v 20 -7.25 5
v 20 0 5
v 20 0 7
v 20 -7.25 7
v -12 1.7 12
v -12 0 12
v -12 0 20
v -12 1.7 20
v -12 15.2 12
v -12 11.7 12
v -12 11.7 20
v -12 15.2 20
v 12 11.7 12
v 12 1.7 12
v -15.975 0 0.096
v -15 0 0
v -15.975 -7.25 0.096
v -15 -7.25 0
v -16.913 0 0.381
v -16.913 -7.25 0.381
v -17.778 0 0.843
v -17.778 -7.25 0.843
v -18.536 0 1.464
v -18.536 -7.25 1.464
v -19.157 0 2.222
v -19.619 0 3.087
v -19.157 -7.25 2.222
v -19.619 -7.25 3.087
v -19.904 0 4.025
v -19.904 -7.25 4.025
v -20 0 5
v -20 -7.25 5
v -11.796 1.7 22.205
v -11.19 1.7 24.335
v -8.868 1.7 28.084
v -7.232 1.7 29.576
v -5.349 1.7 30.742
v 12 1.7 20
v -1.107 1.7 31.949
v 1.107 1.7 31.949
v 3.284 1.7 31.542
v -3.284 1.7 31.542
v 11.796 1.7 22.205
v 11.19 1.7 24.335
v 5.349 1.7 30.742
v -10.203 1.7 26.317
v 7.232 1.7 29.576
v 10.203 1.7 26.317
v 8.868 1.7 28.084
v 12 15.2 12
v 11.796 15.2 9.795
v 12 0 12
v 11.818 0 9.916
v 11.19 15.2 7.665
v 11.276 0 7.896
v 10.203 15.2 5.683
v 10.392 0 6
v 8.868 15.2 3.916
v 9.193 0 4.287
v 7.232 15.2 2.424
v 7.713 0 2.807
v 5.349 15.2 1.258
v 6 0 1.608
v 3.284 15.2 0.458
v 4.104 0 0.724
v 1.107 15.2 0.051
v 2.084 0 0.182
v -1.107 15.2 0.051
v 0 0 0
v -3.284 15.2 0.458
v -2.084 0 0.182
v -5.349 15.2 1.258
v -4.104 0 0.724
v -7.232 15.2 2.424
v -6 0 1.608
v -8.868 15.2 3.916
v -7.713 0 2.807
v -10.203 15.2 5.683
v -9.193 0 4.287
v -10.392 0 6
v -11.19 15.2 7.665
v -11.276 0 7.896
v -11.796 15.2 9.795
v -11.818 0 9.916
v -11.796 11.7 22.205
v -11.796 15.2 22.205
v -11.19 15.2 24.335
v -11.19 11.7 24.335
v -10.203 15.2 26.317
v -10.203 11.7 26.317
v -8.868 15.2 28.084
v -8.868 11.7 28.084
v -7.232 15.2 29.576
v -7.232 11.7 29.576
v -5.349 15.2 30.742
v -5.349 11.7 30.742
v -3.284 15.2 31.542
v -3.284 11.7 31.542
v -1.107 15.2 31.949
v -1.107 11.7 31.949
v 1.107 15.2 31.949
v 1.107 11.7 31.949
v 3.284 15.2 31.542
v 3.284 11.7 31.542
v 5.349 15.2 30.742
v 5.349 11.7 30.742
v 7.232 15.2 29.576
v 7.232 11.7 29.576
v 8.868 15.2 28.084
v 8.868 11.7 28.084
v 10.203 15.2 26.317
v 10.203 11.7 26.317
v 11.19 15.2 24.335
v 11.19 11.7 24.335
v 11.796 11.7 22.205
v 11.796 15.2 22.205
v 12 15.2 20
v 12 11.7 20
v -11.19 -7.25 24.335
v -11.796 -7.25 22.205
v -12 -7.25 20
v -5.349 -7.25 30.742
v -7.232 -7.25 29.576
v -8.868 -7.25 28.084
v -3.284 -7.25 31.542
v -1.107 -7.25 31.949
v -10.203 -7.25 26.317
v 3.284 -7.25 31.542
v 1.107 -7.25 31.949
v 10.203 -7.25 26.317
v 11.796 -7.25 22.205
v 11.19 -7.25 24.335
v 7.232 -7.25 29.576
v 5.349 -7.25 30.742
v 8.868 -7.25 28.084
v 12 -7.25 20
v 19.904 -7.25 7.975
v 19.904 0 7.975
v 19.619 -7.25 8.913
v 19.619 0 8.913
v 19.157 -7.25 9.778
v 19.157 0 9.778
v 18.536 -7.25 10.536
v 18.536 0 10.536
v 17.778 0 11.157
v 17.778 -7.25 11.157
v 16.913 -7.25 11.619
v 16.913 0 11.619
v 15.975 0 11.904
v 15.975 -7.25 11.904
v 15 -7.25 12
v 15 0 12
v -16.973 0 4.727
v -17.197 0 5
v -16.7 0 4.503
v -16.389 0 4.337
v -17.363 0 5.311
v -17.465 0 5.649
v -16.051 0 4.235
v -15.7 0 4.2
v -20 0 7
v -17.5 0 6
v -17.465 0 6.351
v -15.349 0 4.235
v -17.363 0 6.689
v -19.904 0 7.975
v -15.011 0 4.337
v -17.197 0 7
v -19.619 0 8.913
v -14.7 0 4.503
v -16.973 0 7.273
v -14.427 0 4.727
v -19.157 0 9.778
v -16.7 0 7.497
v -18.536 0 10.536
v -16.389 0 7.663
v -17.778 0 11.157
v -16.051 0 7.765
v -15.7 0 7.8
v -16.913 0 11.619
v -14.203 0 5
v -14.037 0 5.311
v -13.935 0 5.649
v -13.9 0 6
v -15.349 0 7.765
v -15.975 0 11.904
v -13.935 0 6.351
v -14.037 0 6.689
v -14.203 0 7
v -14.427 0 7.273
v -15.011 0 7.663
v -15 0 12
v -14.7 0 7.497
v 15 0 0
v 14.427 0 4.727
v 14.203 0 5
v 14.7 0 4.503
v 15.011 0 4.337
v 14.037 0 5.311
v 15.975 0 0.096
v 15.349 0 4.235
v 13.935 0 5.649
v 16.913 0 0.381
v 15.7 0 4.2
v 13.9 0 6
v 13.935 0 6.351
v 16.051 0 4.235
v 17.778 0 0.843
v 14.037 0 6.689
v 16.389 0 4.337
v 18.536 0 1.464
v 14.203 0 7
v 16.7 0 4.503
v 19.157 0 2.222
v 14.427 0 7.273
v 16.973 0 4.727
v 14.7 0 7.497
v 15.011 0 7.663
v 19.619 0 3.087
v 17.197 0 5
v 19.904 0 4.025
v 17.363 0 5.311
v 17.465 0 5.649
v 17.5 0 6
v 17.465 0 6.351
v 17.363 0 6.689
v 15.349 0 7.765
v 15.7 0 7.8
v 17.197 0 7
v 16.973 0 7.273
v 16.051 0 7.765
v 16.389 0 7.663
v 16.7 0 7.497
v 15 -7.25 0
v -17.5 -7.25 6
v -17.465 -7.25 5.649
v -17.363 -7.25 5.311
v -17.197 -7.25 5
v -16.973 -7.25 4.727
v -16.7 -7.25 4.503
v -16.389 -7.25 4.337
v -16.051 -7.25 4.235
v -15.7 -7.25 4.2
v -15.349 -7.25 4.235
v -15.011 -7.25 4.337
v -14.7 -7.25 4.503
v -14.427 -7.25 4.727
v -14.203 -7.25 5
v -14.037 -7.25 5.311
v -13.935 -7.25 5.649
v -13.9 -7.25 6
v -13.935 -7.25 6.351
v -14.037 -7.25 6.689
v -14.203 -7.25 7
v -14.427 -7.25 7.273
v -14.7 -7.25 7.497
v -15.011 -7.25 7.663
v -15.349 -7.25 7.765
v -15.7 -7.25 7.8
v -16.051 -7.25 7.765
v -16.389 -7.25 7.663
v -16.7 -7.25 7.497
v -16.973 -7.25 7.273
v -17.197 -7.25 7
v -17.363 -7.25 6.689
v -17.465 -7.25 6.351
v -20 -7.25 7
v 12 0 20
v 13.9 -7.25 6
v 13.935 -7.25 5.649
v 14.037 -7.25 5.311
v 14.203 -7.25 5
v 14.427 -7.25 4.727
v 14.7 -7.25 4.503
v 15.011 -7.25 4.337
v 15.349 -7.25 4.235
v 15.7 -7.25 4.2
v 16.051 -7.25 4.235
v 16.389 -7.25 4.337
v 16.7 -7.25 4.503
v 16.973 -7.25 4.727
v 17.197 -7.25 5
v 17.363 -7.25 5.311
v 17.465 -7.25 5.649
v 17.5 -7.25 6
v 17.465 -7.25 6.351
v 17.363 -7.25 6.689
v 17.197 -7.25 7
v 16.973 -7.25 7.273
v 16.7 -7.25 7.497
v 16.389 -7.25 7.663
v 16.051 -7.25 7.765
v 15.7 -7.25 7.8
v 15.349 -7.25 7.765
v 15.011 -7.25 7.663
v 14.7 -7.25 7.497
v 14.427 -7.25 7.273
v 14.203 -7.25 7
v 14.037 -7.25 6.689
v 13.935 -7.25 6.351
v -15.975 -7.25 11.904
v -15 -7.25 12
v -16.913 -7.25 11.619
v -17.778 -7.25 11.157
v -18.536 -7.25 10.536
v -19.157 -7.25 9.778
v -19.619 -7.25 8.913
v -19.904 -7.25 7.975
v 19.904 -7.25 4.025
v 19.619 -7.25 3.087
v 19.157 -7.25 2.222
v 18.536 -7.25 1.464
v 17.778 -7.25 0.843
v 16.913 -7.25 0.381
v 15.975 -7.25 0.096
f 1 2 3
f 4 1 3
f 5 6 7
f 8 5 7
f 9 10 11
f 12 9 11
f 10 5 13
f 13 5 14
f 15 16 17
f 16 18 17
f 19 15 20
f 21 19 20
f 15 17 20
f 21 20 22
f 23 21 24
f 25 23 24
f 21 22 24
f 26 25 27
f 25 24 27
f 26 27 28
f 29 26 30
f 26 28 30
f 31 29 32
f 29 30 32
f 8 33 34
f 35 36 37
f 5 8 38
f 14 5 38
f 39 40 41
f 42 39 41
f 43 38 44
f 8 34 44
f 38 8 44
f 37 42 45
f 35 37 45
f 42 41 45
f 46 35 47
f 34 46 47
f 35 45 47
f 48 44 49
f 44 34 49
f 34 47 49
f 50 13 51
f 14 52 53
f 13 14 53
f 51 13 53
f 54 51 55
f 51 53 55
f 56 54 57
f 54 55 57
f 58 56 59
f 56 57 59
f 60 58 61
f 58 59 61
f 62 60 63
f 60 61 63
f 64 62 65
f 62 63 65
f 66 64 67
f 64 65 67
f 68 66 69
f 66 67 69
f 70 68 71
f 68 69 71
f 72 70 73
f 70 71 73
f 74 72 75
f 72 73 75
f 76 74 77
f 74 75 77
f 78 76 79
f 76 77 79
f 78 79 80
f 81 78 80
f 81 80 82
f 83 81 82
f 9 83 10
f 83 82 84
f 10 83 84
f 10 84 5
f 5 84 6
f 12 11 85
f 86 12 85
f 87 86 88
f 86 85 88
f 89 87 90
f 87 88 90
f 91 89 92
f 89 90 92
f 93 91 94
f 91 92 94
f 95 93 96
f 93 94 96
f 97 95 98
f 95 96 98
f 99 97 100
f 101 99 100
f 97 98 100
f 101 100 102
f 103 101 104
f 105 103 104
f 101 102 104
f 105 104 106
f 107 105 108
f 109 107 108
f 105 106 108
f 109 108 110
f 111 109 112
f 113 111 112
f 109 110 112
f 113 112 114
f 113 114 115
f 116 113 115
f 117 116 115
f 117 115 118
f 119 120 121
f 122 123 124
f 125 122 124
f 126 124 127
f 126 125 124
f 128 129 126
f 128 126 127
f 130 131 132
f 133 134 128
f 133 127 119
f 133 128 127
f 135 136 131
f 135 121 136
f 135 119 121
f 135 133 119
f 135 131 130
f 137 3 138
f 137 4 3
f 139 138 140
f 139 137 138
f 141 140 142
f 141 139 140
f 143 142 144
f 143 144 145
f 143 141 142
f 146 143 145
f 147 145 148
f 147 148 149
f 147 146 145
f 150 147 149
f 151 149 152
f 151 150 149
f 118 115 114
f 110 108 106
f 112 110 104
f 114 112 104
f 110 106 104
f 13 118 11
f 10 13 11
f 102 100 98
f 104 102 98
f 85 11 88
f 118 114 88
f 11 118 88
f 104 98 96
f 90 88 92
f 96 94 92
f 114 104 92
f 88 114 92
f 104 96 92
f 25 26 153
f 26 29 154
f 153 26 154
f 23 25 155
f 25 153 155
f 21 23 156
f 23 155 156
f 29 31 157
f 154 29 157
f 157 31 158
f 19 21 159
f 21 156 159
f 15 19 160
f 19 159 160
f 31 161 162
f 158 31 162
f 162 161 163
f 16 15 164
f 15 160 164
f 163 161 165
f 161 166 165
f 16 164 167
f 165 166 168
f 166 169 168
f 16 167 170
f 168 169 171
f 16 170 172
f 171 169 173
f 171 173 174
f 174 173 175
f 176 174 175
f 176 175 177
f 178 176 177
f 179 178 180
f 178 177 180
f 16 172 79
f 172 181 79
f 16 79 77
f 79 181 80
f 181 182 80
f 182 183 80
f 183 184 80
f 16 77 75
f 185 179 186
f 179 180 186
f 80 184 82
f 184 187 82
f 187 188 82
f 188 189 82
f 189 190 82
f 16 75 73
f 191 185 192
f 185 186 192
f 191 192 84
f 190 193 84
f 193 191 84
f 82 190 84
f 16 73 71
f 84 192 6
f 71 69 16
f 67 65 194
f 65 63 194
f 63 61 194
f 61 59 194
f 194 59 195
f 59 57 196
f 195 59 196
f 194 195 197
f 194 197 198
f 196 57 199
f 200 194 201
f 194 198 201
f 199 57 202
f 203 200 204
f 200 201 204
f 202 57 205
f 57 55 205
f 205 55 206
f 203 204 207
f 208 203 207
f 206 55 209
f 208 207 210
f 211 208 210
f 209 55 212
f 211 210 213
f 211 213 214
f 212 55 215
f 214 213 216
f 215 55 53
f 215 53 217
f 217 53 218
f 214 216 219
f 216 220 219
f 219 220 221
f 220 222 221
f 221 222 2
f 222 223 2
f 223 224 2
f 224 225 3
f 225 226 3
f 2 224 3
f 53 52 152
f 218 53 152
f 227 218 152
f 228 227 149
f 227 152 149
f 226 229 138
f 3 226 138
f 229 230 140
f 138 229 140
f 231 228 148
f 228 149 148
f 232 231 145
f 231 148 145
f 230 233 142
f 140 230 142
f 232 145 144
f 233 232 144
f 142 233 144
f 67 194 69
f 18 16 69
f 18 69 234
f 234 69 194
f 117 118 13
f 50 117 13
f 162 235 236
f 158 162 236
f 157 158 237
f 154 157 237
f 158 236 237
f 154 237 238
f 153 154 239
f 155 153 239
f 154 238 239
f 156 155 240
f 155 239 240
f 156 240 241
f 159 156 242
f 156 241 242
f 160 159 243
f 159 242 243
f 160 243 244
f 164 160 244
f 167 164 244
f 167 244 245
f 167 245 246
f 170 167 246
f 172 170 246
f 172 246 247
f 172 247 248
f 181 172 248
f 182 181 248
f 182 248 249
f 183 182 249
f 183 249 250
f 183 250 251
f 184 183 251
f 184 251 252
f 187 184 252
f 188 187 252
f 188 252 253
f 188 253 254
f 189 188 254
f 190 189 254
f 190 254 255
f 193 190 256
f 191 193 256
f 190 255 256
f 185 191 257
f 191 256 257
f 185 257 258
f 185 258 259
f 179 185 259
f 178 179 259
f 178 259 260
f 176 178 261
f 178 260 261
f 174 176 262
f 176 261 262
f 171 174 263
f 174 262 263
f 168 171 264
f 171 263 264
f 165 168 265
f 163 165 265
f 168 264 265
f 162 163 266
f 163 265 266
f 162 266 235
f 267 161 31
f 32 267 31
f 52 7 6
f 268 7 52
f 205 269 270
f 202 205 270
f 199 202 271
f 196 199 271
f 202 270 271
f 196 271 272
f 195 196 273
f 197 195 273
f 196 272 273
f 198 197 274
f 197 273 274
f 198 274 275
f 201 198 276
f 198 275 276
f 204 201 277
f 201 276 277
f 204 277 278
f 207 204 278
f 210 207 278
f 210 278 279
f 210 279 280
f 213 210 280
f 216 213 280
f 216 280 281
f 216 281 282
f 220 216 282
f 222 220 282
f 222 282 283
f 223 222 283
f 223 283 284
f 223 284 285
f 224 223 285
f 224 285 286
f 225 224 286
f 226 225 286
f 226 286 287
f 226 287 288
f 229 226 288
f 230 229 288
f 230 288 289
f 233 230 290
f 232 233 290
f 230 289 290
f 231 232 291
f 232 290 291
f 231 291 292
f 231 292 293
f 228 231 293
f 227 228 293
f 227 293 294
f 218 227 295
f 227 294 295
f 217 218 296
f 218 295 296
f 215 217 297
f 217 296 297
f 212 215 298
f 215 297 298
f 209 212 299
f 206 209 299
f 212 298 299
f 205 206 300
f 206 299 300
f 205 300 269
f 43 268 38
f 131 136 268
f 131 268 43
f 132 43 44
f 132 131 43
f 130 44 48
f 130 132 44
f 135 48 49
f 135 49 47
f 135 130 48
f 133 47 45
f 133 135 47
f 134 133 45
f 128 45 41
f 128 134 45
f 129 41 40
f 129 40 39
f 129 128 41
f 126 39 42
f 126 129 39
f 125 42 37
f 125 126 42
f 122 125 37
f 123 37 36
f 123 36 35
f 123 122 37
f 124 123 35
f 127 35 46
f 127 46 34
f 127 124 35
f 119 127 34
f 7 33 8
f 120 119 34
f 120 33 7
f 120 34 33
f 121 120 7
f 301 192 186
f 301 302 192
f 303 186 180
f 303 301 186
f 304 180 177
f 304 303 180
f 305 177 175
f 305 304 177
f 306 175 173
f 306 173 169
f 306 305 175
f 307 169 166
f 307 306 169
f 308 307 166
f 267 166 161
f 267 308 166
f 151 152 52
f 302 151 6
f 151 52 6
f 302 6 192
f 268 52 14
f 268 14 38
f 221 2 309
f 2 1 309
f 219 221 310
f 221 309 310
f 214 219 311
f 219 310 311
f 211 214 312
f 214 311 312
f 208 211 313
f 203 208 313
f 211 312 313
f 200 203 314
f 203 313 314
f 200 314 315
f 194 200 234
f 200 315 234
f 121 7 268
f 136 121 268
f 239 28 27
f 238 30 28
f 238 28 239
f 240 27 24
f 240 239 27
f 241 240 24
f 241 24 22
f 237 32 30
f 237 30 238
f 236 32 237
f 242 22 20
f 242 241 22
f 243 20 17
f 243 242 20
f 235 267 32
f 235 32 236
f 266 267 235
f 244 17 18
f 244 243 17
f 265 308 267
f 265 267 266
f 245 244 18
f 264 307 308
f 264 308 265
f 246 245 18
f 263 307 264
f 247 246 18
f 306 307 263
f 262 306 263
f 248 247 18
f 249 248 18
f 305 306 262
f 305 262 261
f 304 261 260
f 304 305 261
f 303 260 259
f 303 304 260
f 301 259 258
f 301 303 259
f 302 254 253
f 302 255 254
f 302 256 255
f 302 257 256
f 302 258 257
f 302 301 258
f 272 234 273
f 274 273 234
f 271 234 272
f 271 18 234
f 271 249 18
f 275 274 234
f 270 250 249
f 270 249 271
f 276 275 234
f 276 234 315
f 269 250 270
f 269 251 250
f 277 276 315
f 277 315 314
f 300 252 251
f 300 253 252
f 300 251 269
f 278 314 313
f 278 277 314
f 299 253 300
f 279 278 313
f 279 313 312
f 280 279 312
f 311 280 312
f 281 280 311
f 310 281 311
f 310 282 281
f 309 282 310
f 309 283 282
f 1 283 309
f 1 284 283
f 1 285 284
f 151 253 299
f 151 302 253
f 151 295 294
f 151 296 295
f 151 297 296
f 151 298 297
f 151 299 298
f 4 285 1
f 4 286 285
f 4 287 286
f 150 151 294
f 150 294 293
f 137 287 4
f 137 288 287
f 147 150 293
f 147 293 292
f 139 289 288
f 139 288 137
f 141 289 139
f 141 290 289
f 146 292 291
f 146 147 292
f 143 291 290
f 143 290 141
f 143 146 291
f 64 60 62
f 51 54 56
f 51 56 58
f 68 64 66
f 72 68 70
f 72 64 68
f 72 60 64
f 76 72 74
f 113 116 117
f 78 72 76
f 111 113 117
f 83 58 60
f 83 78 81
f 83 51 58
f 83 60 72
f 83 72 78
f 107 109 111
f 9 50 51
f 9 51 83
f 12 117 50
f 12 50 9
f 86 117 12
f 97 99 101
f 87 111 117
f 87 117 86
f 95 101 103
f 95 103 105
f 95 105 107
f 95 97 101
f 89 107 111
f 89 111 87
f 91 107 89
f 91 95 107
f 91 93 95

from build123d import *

# Parameters (mm, degrees)
F1_DEPTH = 7.25
F0_W     = 24
F0_H     = 8
F2_DEPTH = 1.7
F4_DEPTH = 10
F6_DEPTH = 3.5
F7_R     = 5
F9_D     = 3.6


with BuildPart() as f1:
    # F0 (on Front) → F1 (new body)
    with BuildSketch(Plane.XZ):
        with BuildLine():
            Line((20, 12), (12, 12))
            ThreePointArc((12, 12), (8.4852813844, 3.5147186359), (2.86e-08, 0))
            Line((2.86e-08, 0), (20, 0))
            Line((20, 0), (20, 12))
        make_face()
        with BuildLine():
            Line((12, 12), (-12, 12))
            ThreePointArc((-12, 12), (-8.4852813641, 3.5147186156), (2.86e-08, 0))
            ThreePointArc((2.86e-08, 0), (8.4852813844, 3.5147186359), (12, 12))
        make_face()
        with BuildLine():
            Line((-12, 12), (-20, 12))
            Line((-20, 12), (-20, 0))
            Line((-20, 0), (2.86e-08, 0))
            ThreePointArc((2.86e-08, 0), (-8.4852813641, 3.5147186156), (-12, 12))
        make_face()
    extrude(amount=F1_DEPTH)



with BuildPart() as f1b:
    # F0 (on Front) → F1, piece 2 (new body)
    with BuildSketch(Plane.XZ):
        with BuildLine():
            ThreePointArc((12, 20), (0, 32), (-12, 20))
            Line((-12, 20), (12, 20))
        make_face()
    extrude(amount=F1_DEPTH)


with BuildPart() as f1_1:
    add(f1.part)

    add(f1b.part)  # F2 merges F1b
    # F0 (on Front) → F2 (join)
    with BuildSketch(Plane.XZ):
        with BuildLine():
            ThreePointArc((12, 20), (0, 32), (-12, 20))
            Line((-12, 20), (12, 20))
        make_face()
        with Locations((0, 16)):
            Rectangle(F0_W, F0_H)
        with BuildLine():
            Line((12, 12), (-12, 12))
            ThreePointArc((-12, 12), (-8.4852813641, 3.5147186156), (2.86e-08, 0))
            ThreePointArc((2.86e-08, 0), (8.4852813844, 3.5147186359), (12, 12))
        make_face()
    extrude(amount=-F2_DEPTH)

    # F3 (on face) → F4 (join)
    with BuildSketch(Plane(origin=(0, 1.7, 0), x_dir=(-1, 0, 0), z_dir=(0, 1, 0))):
        with BuildLine():
            ThreePointArc((-12, 12), (0, 0), (12, 12))
            Line((12, 12), (-12, 12))
        make_face()
    extrude(amount=F4_DEPTH)

    # F5 (on face) → F6 (join)
    with BuildSketch(Plane(origin=(0, 11.7, 0), x_dir=(-1, 0, 0), z_dir=(0, 1, 0))):
        with BuildLine():
            ThreePointArc((12, 20), (0, 32), (-12, 20))
            Line((-12, 20), (-12, 12))
            ThreePointArc((-12, 12), (0, 0), (12, 12))
            Line((12, 12), (12, 20))
        make_face()
    extrude(amount=F6_DEPTH)

    # F7
    f7_edges = [f1_1.edges().sort_by_distance(p)[0] for p in [
        (-20, -3.625, 12),
        (-20, -3.625, 0),
        (20, -3.625, 12),
        (20, -3.625, 0),
    ]]
    fillet(f7_edges, radius=F7_R)

    # F9 (through all)
    with Locations(Plane(origin=(0, 0, 0), x_dir=(1, 0, 0), z_dir=(0, 1, 0))):
        with Locations((15.7, -6), (-15.7, -6)):
            Hole(F9_D / 2)


solid = f1_1.part
